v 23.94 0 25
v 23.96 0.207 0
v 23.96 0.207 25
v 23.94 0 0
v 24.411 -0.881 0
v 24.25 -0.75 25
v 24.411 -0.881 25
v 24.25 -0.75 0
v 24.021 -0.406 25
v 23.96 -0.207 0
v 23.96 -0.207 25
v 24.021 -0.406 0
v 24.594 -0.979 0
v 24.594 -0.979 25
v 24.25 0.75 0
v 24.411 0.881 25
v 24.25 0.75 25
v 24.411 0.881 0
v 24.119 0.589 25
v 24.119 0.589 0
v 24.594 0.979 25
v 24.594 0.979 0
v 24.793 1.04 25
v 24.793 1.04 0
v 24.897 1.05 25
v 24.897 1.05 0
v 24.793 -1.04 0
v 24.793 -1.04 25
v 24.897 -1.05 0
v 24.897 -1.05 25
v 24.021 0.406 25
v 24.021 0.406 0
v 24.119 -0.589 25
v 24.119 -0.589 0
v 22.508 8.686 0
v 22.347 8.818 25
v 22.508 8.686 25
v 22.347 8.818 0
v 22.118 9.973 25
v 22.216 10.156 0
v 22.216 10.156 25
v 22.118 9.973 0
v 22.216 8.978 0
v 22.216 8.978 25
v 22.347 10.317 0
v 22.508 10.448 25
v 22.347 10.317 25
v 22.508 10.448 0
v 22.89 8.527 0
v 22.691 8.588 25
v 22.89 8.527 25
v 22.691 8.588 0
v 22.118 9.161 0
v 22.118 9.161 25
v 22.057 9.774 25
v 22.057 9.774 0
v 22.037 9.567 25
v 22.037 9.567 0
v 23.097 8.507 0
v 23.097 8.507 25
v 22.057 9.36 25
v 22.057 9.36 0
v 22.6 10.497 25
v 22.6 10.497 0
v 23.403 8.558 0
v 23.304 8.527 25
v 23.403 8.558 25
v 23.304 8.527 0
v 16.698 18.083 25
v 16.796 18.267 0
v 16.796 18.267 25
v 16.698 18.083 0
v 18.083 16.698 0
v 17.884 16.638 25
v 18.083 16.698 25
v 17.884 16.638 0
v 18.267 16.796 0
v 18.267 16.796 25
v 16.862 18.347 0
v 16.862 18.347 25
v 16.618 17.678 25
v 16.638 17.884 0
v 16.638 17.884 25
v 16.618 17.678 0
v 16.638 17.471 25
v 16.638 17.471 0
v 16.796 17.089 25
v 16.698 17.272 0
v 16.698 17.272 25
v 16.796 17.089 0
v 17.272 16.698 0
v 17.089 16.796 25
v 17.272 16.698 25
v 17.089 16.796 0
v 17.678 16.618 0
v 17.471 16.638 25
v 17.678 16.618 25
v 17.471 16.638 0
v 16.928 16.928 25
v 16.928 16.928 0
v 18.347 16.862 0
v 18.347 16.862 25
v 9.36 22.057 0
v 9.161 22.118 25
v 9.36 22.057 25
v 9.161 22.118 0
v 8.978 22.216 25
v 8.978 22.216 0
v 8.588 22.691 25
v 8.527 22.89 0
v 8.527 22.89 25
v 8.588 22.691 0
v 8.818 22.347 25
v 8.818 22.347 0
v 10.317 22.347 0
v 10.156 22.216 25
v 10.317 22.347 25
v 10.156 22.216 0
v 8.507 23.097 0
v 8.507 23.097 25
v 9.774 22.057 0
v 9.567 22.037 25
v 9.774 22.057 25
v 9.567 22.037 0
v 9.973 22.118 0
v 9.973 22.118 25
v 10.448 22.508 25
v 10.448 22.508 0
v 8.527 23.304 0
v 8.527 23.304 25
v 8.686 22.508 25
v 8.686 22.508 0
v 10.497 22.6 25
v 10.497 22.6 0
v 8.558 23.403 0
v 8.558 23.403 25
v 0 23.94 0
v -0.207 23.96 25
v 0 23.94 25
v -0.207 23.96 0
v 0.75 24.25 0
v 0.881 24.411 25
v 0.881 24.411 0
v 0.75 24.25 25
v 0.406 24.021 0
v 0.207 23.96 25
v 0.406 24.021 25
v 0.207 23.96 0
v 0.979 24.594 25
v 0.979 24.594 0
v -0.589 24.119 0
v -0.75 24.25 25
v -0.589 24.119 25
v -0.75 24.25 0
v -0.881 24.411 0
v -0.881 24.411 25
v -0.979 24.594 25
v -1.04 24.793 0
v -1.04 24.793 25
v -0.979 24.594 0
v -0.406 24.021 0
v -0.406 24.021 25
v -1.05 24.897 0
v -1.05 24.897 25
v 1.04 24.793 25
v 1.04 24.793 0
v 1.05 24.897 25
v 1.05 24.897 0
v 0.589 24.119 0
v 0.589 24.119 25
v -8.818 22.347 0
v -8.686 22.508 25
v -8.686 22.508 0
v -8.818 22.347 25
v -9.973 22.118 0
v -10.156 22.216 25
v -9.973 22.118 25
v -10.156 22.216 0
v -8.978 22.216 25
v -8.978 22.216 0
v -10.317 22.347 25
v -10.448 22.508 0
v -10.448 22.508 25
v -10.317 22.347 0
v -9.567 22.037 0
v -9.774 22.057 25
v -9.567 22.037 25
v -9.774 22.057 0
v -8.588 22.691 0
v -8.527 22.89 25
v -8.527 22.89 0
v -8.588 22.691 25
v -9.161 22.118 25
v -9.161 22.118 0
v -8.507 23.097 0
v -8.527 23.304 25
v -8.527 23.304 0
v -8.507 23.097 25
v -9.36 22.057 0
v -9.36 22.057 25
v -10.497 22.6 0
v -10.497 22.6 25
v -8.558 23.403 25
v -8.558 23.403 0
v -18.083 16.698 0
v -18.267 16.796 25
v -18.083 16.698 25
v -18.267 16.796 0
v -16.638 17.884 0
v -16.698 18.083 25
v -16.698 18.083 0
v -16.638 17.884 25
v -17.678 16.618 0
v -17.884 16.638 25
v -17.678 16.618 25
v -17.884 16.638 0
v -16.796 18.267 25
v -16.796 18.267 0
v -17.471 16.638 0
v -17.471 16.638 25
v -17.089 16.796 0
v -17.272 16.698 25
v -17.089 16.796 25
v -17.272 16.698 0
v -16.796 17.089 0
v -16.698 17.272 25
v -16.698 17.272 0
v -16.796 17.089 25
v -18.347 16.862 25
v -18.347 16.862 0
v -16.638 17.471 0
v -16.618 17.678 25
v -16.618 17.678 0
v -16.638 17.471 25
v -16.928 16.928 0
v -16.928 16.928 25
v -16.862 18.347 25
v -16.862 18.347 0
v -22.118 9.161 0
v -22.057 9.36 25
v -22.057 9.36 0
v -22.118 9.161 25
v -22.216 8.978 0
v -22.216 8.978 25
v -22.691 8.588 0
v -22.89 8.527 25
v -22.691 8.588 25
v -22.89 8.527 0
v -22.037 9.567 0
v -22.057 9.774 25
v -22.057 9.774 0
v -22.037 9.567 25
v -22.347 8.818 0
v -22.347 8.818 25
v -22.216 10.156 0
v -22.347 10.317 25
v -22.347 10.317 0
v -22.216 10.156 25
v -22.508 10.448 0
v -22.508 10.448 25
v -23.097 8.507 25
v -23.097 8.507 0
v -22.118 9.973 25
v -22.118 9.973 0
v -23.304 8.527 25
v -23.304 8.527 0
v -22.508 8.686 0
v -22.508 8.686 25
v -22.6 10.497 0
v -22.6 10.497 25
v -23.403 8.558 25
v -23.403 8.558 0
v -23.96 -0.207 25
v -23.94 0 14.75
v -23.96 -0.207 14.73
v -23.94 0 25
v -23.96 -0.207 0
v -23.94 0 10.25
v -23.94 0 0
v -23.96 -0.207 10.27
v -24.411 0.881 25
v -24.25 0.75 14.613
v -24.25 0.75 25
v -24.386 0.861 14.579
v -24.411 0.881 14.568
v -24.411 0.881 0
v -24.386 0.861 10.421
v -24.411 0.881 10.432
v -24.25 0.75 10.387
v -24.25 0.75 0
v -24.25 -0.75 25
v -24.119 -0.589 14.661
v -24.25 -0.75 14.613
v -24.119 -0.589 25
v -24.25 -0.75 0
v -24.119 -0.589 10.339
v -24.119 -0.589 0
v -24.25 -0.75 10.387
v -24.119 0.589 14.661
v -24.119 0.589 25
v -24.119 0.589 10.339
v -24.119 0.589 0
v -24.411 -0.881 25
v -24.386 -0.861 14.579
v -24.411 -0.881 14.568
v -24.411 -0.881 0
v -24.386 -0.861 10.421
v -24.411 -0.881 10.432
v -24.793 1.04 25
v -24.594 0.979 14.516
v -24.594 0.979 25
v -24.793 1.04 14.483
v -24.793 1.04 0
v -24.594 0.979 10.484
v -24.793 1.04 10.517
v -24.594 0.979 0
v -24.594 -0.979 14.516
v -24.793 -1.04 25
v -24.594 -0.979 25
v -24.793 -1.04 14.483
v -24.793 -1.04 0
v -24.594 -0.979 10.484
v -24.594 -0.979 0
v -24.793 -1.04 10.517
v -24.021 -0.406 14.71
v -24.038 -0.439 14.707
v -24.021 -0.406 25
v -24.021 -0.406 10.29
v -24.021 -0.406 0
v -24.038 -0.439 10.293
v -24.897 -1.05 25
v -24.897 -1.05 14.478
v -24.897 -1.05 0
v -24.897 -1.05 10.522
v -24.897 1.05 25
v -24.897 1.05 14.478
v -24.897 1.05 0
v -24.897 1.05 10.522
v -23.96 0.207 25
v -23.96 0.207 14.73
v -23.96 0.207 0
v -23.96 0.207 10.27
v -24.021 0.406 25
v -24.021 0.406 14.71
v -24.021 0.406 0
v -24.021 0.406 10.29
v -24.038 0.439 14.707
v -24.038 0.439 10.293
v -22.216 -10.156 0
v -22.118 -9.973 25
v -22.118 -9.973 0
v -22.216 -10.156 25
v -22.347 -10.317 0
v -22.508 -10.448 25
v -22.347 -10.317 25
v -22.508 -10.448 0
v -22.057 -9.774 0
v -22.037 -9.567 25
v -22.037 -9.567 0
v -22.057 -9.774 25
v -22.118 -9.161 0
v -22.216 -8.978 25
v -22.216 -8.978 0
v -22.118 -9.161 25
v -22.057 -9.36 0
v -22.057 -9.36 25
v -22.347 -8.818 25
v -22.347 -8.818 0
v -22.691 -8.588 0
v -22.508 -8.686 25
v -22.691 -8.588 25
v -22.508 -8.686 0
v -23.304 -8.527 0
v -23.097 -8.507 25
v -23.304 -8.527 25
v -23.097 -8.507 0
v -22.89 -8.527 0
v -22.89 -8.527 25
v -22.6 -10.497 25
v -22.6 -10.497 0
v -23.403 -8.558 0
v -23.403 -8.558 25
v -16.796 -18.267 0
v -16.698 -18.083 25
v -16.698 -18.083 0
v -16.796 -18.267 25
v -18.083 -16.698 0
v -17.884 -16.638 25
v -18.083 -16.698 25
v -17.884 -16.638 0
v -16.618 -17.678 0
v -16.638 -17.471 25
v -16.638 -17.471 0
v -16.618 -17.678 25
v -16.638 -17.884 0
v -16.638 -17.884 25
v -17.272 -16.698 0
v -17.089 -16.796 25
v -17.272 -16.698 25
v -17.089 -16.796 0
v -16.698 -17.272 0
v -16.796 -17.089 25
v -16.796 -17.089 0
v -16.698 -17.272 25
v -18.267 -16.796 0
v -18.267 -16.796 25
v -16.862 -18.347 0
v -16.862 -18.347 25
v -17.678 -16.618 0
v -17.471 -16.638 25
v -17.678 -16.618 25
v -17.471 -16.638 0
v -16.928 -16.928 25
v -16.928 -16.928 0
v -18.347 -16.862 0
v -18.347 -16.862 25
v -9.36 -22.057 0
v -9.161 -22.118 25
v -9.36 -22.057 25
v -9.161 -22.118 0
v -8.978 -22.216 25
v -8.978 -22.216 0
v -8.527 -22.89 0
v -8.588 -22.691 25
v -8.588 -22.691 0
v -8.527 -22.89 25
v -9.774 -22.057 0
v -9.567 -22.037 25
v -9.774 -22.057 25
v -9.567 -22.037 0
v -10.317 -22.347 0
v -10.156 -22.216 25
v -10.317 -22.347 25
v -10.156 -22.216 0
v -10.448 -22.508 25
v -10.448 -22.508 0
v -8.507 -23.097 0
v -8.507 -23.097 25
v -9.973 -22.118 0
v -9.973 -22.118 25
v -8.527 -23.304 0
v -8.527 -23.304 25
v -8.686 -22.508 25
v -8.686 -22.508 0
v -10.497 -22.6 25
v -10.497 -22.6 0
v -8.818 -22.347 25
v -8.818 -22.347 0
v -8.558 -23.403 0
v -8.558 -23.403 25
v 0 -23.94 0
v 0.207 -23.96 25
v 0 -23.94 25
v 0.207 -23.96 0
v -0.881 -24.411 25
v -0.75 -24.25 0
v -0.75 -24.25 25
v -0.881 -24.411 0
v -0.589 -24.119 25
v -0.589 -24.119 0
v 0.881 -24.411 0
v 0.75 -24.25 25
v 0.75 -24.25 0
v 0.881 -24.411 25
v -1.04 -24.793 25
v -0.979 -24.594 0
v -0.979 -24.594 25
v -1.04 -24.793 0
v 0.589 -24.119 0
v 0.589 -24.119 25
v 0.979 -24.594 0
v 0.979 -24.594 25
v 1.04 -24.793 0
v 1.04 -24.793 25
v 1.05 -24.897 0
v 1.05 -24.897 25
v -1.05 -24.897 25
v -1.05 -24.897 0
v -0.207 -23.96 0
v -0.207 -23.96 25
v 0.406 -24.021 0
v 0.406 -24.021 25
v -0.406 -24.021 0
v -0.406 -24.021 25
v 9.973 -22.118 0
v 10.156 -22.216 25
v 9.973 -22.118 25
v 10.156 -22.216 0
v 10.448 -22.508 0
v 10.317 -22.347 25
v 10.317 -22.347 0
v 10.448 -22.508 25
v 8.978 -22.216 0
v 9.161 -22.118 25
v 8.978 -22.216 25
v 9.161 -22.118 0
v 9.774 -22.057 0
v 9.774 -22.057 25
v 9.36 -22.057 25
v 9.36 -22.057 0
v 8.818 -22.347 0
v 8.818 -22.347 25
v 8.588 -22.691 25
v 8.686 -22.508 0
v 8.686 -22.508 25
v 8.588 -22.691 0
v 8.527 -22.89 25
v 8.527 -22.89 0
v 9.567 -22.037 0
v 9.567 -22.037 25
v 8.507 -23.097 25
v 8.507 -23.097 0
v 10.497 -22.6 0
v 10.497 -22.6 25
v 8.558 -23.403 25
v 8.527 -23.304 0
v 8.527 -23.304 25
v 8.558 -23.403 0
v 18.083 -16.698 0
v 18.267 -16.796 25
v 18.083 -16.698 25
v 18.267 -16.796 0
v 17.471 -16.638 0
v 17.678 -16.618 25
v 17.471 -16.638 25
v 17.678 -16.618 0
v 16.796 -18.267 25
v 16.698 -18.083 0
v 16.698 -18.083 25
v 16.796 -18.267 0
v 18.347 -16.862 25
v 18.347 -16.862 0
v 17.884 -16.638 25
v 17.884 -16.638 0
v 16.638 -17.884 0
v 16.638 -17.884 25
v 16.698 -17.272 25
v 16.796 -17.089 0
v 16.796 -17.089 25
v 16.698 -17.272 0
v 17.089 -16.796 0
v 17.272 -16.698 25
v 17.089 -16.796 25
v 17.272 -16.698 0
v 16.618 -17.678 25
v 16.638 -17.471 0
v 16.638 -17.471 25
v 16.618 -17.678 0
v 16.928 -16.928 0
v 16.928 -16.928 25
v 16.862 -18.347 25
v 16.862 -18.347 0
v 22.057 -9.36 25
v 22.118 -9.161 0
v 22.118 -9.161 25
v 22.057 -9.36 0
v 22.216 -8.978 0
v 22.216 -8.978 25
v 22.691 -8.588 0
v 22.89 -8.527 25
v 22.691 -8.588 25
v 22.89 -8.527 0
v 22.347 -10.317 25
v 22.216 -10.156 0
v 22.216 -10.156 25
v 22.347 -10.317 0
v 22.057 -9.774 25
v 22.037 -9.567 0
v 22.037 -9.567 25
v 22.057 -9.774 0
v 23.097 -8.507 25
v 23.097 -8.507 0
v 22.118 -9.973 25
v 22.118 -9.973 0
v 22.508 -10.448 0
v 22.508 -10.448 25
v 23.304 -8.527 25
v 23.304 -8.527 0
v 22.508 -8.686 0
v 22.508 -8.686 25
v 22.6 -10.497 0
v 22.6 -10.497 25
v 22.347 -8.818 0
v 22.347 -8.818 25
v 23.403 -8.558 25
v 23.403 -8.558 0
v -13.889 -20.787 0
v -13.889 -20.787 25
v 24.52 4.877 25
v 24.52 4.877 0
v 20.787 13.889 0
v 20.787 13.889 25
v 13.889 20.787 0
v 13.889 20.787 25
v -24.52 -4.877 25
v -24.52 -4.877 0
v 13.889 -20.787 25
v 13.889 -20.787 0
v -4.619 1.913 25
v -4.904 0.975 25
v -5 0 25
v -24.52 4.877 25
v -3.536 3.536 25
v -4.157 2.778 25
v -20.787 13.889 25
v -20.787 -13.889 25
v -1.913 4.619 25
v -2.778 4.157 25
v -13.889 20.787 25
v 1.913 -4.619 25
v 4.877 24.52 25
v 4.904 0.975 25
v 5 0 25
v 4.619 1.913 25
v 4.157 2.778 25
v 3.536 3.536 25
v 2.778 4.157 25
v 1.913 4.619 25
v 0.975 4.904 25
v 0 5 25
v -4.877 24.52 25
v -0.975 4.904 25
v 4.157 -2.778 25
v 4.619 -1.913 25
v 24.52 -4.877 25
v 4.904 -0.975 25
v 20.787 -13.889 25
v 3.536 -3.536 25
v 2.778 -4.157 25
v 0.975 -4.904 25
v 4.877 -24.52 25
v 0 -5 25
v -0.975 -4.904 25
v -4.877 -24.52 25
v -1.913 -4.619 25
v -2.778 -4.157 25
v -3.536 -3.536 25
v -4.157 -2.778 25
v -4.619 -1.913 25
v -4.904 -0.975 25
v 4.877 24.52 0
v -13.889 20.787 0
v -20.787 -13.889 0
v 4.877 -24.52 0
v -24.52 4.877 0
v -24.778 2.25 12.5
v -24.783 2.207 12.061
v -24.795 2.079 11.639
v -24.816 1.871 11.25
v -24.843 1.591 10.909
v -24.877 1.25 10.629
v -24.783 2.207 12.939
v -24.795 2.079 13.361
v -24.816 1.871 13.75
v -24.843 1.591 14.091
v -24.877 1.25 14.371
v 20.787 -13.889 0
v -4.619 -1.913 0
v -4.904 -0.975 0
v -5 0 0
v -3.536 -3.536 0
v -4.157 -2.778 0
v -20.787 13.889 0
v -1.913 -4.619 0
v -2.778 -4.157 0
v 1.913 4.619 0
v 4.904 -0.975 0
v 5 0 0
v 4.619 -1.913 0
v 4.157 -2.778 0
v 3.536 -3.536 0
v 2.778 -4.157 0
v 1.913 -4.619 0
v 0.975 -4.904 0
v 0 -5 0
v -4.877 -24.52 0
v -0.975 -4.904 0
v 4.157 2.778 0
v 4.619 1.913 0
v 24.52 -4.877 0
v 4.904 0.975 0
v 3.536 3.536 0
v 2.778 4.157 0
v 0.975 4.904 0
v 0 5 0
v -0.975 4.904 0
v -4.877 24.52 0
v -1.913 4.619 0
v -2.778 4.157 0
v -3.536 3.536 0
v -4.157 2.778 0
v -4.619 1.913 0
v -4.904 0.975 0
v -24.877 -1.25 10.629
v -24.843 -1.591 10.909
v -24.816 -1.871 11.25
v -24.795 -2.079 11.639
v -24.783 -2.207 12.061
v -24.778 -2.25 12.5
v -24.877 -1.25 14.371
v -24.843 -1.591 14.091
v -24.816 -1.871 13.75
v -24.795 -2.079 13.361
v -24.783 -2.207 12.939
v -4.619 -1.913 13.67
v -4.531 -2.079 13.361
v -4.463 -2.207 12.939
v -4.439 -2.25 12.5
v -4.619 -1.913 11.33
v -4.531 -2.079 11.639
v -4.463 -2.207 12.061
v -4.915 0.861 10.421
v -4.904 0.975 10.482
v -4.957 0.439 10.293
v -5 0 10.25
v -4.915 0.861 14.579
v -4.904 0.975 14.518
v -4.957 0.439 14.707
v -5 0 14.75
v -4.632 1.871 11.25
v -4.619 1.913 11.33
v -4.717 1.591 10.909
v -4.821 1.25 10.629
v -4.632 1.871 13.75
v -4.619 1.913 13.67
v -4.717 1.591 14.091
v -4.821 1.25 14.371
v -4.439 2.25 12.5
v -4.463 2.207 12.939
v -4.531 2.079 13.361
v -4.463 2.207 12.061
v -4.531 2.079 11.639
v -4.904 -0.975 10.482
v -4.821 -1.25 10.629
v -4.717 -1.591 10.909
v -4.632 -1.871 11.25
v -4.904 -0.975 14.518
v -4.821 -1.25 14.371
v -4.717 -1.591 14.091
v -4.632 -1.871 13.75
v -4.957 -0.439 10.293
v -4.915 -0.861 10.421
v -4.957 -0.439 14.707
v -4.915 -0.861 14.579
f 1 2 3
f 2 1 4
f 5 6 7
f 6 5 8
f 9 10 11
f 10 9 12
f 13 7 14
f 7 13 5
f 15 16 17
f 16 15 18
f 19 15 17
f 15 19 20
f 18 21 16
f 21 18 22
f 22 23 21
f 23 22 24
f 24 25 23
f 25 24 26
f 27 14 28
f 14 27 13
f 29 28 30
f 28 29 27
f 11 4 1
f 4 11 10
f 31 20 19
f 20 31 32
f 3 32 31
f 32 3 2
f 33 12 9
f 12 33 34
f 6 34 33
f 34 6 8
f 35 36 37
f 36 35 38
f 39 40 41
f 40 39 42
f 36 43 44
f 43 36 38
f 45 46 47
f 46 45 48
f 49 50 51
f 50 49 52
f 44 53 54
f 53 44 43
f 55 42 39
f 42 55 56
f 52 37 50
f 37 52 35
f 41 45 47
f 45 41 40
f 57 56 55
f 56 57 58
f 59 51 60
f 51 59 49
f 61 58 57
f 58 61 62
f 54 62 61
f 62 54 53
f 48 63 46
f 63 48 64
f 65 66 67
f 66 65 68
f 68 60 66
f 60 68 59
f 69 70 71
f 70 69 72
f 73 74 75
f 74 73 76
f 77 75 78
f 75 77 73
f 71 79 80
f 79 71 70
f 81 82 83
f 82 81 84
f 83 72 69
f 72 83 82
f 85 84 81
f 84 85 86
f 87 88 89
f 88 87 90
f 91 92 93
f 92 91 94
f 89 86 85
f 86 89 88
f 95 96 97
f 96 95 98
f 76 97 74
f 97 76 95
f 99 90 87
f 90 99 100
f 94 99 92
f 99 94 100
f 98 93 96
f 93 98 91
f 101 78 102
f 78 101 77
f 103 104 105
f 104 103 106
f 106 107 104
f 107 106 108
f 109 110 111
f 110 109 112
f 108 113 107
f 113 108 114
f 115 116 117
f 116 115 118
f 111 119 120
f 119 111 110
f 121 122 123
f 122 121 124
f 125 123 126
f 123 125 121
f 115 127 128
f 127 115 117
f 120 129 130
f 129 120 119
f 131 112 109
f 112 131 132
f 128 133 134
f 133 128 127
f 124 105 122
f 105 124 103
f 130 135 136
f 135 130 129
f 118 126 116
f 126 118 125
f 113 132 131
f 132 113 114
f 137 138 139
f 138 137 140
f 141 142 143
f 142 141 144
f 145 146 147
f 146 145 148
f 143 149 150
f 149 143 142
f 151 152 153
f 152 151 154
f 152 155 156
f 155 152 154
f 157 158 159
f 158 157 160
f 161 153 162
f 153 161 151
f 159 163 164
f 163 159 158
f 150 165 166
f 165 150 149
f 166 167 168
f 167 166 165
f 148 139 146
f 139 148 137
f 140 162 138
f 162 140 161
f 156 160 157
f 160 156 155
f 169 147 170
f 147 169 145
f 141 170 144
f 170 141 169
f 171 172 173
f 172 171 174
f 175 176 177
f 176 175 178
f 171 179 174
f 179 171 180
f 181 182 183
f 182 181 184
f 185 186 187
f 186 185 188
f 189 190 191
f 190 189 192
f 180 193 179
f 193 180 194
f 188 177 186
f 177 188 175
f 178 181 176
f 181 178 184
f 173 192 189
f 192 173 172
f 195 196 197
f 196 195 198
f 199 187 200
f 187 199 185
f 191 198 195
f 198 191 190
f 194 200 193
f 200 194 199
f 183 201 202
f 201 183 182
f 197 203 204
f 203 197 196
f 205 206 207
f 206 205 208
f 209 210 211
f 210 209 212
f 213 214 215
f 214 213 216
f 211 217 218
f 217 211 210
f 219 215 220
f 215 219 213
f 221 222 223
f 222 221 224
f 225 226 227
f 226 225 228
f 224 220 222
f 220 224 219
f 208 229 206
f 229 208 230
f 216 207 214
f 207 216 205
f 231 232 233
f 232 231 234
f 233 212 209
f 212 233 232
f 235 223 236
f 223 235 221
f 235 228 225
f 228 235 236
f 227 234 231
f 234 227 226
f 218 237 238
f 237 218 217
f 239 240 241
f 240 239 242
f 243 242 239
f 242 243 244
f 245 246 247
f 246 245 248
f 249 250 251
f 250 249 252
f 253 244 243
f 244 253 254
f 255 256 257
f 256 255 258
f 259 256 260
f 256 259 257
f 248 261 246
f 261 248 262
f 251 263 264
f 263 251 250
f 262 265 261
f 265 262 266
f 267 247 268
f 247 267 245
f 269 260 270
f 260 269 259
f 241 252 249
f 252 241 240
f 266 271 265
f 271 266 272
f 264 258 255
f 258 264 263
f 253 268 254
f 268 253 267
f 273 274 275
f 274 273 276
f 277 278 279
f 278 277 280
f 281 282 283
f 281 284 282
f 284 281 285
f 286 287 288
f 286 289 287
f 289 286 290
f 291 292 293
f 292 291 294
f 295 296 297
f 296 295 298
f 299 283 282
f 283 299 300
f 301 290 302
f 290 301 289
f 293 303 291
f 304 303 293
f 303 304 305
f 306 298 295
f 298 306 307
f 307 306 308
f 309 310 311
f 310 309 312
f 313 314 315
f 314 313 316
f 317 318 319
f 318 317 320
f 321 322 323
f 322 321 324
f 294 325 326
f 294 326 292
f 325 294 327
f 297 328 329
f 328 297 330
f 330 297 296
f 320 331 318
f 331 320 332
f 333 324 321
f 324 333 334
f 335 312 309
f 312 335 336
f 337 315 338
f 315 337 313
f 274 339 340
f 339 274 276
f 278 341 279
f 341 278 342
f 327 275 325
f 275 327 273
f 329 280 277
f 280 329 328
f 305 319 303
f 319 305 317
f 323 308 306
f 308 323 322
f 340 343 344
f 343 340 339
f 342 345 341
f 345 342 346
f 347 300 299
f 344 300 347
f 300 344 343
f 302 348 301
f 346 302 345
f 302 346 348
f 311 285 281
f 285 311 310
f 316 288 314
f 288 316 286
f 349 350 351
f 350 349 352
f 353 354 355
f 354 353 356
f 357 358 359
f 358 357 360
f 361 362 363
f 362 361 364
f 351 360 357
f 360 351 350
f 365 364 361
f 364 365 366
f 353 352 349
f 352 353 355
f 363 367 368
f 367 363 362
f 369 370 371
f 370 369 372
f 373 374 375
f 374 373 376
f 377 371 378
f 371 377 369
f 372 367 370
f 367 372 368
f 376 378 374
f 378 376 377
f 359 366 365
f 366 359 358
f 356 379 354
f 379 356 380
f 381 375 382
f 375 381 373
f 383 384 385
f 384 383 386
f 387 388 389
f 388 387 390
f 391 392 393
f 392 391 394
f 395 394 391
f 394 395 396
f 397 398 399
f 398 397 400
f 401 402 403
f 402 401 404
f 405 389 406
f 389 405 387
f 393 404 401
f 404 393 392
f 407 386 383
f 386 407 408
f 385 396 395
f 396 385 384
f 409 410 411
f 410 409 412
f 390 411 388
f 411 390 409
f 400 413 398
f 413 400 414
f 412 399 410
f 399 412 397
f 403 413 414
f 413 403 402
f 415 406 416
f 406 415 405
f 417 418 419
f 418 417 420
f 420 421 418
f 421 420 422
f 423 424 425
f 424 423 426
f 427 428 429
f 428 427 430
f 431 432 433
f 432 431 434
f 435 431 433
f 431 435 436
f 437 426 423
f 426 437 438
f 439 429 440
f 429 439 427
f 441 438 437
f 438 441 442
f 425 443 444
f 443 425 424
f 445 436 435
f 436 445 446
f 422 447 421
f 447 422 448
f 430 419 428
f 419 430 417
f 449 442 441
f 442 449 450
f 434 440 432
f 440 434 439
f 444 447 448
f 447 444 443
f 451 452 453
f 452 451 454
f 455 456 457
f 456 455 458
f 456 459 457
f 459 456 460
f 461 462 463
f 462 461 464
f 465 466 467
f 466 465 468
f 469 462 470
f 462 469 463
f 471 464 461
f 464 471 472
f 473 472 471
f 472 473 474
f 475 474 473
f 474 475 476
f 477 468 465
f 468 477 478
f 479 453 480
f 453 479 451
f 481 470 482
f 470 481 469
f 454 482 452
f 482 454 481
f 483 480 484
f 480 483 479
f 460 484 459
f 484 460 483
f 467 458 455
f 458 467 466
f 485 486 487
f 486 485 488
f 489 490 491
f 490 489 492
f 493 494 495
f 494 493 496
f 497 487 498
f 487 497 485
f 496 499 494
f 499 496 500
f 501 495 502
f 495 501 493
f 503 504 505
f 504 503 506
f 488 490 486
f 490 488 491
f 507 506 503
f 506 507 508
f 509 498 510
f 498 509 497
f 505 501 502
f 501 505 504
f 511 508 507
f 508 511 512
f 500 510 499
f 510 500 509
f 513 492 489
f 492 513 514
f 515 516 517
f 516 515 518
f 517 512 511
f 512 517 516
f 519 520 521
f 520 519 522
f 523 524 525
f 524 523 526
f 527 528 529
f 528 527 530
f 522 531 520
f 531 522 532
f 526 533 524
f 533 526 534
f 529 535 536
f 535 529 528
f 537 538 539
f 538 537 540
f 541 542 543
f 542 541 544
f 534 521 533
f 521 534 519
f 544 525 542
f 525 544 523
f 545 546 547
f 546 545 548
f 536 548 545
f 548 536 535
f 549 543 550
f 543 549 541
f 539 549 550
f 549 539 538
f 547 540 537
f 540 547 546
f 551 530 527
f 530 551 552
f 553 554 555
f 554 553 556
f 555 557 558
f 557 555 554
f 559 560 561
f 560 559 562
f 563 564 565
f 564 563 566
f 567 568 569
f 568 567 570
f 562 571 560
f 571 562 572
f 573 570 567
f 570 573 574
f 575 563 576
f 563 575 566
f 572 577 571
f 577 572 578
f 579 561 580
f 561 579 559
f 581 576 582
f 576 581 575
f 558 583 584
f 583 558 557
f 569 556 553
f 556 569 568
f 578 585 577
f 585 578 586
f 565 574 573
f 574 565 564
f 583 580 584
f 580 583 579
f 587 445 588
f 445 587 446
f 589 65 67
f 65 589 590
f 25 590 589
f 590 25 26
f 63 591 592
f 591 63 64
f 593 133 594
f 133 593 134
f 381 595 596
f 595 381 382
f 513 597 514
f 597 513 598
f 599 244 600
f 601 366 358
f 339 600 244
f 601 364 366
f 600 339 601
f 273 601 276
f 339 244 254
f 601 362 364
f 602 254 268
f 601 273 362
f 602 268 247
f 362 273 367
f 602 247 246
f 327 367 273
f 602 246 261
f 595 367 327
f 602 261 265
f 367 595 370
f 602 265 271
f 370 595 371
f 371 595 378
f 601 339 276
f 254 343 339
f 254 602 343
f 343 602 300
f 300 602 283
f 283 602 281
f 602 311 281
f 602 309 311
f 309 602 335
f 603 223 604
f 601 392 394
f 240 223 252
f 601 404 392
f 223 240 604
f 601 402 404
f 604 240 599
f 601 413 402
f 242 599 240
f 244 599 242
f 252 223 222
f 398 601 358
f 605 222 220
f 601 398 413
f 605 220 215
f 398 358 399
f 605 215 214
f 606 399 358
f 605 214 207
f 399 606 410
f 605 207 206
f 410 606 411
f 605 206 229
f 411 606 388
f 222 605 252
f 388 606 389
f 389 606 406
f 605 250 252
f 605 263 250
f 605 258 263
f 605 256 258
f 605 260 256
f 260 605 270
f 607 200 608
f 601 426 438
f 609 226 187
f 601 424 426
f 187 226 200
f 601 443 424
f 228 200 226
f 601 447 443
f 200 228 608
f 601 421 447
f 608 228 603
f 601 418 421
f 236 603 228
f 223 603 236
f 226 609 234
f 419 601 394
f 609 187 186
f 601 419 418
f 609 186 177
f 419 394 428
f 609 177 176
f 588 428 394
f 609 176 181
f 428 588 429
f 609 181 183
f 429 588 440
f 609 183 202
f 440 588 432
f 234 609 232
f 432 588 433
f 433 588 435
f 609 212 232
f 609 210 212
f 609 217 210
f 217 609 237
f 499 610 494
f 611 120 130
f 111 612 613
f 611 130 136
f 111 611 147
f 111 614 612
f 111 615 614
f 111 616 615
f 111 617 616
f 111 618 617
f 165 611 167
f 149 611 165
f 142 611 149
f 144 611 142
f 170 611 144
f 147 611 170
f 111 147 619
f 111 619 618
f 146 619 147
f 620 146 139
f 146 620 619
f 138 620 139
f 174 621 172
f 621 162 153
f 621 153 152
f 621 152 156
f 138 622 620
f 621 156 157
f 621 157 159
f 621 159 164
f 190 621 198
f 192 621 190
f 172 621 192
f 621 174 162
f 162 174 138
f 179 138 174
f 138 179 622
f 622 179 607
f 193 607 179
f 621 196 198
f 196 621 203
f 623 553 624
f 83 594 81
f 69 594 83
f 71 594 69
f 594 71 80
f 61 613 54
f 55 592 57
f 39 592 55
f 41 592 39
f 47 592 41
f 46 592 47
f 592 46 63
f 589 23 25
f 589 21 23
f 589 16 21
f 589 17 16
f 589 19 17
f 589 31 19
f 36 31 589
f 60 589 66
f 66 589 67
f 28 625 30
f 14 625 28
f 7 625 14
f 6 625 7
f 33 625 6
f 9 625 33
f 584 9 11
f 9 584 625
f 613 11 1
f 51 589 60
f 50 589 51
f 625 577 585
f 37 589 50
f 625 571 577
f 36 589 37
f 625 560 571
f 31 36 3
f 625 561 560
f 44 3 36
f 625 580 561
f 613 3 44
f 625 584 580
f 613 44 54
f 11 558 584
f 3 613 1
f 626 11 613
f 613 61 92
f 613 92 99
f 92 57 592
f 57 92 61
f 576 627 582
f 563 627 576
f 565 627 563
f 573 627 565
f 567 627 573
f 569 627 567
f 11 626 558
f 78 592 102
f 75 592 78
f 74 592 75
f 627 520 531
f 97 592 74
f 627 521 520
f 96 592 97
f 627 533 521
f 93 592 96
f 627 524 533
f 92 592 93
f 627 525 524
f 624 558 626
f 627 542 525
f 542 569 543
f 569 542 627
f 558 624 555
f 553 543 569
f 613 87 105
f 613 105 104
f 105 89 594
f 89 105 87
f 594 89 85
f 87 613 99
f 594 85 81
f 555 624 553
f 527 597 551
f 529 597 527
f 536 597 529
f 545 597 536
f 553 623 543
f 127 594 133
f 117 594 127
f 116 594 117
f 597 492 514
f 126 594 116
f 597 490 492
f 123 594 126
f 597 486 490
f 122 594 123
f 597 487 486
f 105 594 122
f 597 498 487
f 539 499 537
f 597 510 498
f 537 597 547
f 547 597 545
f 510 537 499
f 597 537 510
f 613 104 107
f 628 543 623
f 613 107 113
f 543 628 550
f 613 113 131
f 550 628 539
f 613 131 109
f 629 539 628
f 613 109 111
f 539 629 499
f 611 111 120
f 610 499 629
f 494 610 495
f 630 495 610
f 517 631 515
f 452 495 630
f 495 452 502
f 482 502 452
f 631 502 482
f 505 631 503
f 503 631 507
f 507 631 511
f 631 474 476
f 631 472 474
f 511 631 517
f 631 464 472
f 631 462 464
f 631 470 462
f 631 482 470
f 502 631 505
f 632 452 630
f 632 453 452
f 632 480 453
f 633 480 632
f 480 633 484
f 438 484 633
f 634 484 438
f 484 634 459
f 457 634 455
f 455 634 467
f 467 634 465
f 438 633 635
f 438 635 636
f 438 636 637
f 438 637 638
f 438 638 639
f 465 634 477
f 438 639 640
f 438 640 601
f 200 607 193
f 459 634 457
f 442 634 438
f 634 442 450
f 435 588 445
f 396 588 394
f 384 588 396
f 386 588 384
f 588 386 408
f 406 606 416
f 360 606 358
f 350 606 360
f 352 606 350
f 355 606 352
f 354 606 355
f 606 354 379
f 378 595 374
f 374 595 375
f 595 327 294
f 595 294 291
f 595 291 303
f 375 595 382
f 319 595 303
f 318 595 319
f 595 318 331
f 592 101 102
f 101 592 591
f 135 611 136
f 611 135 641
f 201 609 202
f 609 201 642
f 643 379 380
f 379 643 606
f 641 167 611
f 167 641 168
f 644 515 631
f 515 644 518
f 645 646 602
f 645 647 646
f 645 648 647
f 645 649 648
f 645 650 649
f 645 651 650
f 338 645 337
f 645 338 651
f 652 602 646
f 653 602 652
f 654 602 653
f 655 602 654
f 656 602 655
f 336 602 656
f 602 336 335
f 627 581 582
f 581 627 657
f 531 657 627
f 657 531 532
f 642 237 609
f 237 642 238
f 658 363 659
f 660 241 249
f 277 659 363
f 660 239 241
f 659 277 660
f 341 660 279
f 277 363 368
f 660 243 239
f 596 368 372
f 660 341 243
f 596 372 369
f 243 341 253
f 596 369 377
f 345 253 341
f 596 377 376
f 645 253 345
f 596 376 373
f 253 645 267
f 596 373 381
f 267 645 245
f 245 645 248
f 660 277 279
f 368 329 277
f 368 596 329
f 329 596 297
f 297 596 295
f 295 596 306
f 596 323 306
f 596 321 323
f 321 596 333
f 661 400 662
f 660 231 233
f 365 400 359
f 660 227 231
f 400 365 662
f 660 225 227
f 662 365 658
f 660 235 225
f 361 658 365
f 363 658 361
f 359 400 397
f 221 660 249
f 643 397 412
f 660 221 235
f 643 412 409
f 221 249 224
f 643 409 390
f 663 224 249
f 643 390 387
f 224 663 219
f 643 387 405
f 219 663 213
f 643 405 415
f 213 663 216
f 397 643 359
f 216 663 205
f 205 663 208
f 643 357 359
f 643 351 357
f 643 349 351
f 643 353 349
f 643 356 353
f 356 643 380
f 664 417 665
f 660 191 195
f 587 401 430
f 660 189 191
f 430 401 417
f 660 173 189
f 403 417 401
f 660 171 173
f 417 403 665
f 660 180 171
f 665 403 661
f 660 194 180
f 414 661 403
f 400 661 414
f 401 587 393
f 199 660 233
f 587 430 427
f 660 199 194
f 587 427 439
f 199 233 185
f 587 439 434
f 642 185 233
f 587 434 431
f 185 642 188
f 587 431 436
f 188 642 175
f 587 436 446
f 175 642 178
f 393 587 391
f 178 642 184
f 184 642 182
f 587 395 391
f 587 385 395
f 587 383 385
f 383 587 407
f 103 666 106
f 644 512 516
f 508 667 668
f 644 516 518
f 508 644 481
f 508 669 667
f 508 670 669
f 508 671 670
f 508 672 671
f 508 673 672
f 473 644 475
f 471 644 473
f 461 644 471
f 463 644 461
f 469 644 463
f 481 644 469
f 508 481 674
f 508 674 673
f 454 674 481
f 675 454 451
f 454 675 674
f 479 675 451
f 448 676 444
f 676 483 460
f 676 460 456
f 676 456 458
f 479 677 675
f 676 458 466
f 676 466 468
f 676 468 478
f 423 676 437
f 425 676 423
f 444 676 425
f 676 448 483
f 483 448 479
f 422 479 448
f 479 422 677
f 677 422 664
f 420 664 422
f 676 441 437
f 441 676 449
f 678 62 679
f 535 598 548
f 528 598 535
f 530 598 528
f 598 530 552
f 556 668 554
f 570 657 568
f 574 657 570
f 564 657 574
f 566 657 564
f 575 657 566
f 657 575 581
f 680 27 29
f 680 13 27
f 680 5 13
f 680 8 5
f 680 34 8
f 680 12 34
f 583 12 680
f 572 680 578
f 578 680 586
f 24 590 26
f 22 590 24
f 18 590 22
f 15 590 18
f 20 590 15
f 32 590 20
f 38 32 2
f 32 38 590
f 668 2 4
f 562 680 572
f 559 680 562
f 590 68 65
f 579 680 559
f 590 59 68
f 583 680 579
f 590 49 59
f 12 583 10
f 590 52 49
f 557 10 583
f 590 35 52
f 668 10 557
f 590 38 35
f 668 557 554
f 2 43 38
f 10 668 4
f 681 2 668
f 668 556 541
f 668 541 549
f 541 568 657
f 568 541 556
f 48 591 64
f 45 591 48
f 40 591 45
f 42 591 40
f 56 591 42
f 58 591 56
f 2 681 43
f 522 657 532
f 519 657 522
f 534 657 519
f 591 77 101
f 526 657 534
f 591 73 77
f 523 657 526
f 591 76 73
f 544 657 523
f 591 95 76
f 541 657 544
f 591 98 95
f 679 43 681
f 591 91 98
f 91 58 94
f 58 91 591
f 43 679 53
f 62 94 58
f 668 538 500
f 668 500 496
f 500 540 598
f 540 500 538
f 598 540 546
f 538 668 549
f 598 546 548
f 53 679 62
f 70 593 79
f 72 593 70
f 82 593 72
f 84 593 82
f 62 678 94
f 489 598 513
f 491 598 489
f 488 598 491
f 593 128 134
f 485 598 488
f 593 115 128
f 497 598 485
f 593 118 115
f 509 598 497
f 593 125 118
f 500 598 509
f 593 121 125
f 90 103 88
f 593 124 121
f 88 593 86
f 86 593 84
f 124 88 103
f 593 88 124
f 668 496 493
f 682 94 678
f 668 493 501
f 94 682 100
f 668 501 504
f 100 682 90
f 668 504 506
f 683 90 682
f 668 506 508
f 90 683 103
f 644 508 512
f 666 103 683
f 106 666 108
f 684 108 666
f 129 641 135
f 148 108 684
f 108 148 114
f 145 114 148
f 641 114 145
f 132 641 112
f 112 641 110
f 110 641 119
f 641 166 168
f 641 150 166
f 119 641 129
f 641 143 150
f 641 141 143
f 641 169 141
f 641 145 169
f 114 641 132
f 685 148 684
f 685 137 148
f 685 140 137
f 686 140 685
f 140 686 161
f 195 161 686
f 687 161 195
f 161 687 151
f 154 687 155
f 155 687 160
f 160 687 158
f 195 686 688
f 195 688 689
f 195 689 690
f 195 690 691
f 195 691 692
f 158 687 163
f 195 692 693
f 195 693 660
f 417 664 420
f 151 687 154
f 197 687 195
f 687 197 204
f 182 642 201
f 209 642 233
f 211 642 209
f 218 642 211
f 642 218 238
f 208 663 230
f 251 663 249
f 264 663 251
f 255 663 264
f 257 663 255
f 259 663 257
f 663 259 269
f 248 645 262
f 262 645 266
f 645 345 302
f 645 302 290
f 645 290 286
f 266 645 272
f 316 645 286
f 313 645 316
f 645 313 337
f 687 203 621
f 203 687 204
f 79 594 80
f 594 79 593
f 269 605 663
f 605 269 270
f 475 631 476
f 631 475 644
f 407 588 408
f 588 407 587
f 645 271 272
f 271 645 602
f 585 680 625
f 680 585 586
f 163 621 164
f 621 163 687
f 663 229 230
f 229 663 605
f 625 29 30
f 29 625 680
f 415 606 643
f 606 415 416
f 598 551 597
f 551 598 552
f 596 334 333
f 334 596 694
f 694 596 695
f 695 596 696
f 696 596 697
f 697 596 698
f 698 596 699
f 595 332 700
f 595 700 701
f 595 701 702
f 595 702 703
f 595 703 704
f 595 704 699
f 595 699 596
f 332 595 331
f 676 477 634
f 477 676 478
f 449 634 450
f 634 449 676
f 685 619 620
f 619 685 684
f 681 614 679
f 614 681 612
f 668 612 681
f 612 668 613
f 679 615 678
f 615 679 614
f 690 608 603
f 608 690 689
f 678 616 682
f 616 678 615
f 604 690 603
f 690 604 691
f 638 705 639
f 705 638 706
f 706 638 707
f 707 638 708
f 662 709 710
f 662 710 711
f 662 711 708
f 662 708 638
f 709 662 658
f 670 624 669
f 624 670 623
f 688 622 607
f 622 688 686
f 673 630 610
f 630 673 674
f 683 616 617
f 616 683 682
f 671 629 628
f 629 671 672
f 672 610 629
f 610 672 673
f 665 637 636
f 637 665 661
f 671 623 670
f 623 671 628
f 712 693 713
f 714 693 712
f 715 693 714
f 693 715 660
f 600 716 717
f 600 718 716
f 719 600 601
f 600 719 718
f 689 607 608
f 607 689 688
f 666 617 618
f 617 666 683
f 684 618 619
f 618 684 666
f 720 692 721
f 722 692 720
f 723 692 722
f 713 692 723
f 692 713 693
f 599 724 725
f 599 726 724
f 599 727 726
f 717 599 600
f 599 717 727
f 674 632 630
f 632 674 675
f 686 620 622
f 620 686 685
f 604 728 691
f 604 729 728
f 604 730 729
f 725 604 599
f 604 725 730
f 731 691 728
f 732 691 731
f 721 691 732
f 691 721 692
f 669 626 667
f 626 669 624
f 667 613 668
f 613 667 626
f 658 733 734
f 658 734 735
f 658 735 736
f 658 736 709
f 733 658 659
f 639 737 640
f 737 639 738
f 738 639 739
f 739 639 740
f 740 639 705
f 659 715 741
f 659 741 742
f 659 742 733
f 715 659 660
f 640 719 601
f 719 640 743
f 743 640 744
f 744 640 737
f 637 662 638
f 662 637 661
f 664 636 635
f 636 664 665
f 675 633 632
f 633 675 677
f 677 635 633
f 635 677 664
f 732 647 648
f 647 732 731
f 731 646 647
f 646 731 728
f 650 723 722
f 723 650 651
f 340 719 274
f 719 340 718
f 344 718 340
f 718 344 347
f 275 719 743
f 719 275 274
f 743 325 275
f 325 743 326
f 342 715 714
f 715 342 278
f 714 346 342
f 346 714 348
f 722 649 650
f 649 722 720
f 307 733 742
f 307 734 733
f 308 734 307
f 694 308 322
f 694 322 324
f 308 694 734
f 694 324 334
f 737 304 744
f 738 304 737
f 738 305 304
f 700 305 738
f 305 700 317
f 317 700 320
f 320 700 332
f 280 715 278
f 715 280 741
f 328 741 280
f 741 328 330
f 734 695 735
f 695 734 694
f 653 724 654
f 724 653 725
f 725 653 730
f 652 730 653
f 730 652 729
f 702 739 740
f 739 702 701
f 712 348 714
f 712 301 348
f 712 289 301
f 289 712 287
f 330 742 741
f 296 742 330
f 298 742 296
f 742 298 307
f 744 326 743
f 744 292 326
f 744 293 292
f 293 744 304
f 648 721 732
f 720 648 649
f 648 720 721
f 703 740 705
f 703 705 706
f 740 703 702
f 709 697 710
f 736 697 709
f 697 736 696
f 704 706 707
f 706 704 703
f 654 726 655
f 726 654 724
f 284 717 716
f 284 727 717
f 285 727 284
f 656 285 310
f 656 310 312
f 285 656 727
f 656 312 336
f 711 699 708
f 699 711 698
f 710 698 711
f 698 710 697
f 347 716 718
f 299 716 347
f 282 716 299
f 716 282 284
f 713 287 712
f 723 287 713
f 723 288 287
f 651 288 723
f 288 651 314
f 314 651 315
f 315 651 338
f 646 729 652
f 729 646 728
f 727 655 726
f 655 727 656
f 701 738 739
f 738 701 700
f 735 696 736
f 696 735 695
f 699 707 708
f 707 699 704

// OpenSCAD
$fn = 32;

// ----------------------------------------------------------------------
// Hand knob: 50 x 50 x 25 mm
// ----------------------------------------------------------------------

// --- parameters (mm) ---
head_d = 50;              // knob diameter
head_h = 25;              // knob height
hole_d = 10;              // shaft bore
set_d = 4.5;              // set screw tap hole
notch_d = 2.12;           // knurl groove diameter
knurl_n = 16;             // number of knurl grooves

module body() {
  cylinder(h = head_h, d = head_d);
}

difference() {
  union() {
    body();
  }
  translate([0, 0, -1]) cylinder(h = head_h + 0 + 2, d = hole_d);
  /* knurl grooves */
  for (i = [0 : knurl_n - 1])
    rotate([0, 0, i * 360 / knurl_n])
      translate([head_d / 2, 0, -0.5])
        cylinder(h = head_h + 1, d = notch_d);
  translate([-head_d / 2 - 1, 0, head_h * 0.5]) rotate([0, 90, 0]) cylinder(h = head_d / 2 + 2, d = set_d);
}
